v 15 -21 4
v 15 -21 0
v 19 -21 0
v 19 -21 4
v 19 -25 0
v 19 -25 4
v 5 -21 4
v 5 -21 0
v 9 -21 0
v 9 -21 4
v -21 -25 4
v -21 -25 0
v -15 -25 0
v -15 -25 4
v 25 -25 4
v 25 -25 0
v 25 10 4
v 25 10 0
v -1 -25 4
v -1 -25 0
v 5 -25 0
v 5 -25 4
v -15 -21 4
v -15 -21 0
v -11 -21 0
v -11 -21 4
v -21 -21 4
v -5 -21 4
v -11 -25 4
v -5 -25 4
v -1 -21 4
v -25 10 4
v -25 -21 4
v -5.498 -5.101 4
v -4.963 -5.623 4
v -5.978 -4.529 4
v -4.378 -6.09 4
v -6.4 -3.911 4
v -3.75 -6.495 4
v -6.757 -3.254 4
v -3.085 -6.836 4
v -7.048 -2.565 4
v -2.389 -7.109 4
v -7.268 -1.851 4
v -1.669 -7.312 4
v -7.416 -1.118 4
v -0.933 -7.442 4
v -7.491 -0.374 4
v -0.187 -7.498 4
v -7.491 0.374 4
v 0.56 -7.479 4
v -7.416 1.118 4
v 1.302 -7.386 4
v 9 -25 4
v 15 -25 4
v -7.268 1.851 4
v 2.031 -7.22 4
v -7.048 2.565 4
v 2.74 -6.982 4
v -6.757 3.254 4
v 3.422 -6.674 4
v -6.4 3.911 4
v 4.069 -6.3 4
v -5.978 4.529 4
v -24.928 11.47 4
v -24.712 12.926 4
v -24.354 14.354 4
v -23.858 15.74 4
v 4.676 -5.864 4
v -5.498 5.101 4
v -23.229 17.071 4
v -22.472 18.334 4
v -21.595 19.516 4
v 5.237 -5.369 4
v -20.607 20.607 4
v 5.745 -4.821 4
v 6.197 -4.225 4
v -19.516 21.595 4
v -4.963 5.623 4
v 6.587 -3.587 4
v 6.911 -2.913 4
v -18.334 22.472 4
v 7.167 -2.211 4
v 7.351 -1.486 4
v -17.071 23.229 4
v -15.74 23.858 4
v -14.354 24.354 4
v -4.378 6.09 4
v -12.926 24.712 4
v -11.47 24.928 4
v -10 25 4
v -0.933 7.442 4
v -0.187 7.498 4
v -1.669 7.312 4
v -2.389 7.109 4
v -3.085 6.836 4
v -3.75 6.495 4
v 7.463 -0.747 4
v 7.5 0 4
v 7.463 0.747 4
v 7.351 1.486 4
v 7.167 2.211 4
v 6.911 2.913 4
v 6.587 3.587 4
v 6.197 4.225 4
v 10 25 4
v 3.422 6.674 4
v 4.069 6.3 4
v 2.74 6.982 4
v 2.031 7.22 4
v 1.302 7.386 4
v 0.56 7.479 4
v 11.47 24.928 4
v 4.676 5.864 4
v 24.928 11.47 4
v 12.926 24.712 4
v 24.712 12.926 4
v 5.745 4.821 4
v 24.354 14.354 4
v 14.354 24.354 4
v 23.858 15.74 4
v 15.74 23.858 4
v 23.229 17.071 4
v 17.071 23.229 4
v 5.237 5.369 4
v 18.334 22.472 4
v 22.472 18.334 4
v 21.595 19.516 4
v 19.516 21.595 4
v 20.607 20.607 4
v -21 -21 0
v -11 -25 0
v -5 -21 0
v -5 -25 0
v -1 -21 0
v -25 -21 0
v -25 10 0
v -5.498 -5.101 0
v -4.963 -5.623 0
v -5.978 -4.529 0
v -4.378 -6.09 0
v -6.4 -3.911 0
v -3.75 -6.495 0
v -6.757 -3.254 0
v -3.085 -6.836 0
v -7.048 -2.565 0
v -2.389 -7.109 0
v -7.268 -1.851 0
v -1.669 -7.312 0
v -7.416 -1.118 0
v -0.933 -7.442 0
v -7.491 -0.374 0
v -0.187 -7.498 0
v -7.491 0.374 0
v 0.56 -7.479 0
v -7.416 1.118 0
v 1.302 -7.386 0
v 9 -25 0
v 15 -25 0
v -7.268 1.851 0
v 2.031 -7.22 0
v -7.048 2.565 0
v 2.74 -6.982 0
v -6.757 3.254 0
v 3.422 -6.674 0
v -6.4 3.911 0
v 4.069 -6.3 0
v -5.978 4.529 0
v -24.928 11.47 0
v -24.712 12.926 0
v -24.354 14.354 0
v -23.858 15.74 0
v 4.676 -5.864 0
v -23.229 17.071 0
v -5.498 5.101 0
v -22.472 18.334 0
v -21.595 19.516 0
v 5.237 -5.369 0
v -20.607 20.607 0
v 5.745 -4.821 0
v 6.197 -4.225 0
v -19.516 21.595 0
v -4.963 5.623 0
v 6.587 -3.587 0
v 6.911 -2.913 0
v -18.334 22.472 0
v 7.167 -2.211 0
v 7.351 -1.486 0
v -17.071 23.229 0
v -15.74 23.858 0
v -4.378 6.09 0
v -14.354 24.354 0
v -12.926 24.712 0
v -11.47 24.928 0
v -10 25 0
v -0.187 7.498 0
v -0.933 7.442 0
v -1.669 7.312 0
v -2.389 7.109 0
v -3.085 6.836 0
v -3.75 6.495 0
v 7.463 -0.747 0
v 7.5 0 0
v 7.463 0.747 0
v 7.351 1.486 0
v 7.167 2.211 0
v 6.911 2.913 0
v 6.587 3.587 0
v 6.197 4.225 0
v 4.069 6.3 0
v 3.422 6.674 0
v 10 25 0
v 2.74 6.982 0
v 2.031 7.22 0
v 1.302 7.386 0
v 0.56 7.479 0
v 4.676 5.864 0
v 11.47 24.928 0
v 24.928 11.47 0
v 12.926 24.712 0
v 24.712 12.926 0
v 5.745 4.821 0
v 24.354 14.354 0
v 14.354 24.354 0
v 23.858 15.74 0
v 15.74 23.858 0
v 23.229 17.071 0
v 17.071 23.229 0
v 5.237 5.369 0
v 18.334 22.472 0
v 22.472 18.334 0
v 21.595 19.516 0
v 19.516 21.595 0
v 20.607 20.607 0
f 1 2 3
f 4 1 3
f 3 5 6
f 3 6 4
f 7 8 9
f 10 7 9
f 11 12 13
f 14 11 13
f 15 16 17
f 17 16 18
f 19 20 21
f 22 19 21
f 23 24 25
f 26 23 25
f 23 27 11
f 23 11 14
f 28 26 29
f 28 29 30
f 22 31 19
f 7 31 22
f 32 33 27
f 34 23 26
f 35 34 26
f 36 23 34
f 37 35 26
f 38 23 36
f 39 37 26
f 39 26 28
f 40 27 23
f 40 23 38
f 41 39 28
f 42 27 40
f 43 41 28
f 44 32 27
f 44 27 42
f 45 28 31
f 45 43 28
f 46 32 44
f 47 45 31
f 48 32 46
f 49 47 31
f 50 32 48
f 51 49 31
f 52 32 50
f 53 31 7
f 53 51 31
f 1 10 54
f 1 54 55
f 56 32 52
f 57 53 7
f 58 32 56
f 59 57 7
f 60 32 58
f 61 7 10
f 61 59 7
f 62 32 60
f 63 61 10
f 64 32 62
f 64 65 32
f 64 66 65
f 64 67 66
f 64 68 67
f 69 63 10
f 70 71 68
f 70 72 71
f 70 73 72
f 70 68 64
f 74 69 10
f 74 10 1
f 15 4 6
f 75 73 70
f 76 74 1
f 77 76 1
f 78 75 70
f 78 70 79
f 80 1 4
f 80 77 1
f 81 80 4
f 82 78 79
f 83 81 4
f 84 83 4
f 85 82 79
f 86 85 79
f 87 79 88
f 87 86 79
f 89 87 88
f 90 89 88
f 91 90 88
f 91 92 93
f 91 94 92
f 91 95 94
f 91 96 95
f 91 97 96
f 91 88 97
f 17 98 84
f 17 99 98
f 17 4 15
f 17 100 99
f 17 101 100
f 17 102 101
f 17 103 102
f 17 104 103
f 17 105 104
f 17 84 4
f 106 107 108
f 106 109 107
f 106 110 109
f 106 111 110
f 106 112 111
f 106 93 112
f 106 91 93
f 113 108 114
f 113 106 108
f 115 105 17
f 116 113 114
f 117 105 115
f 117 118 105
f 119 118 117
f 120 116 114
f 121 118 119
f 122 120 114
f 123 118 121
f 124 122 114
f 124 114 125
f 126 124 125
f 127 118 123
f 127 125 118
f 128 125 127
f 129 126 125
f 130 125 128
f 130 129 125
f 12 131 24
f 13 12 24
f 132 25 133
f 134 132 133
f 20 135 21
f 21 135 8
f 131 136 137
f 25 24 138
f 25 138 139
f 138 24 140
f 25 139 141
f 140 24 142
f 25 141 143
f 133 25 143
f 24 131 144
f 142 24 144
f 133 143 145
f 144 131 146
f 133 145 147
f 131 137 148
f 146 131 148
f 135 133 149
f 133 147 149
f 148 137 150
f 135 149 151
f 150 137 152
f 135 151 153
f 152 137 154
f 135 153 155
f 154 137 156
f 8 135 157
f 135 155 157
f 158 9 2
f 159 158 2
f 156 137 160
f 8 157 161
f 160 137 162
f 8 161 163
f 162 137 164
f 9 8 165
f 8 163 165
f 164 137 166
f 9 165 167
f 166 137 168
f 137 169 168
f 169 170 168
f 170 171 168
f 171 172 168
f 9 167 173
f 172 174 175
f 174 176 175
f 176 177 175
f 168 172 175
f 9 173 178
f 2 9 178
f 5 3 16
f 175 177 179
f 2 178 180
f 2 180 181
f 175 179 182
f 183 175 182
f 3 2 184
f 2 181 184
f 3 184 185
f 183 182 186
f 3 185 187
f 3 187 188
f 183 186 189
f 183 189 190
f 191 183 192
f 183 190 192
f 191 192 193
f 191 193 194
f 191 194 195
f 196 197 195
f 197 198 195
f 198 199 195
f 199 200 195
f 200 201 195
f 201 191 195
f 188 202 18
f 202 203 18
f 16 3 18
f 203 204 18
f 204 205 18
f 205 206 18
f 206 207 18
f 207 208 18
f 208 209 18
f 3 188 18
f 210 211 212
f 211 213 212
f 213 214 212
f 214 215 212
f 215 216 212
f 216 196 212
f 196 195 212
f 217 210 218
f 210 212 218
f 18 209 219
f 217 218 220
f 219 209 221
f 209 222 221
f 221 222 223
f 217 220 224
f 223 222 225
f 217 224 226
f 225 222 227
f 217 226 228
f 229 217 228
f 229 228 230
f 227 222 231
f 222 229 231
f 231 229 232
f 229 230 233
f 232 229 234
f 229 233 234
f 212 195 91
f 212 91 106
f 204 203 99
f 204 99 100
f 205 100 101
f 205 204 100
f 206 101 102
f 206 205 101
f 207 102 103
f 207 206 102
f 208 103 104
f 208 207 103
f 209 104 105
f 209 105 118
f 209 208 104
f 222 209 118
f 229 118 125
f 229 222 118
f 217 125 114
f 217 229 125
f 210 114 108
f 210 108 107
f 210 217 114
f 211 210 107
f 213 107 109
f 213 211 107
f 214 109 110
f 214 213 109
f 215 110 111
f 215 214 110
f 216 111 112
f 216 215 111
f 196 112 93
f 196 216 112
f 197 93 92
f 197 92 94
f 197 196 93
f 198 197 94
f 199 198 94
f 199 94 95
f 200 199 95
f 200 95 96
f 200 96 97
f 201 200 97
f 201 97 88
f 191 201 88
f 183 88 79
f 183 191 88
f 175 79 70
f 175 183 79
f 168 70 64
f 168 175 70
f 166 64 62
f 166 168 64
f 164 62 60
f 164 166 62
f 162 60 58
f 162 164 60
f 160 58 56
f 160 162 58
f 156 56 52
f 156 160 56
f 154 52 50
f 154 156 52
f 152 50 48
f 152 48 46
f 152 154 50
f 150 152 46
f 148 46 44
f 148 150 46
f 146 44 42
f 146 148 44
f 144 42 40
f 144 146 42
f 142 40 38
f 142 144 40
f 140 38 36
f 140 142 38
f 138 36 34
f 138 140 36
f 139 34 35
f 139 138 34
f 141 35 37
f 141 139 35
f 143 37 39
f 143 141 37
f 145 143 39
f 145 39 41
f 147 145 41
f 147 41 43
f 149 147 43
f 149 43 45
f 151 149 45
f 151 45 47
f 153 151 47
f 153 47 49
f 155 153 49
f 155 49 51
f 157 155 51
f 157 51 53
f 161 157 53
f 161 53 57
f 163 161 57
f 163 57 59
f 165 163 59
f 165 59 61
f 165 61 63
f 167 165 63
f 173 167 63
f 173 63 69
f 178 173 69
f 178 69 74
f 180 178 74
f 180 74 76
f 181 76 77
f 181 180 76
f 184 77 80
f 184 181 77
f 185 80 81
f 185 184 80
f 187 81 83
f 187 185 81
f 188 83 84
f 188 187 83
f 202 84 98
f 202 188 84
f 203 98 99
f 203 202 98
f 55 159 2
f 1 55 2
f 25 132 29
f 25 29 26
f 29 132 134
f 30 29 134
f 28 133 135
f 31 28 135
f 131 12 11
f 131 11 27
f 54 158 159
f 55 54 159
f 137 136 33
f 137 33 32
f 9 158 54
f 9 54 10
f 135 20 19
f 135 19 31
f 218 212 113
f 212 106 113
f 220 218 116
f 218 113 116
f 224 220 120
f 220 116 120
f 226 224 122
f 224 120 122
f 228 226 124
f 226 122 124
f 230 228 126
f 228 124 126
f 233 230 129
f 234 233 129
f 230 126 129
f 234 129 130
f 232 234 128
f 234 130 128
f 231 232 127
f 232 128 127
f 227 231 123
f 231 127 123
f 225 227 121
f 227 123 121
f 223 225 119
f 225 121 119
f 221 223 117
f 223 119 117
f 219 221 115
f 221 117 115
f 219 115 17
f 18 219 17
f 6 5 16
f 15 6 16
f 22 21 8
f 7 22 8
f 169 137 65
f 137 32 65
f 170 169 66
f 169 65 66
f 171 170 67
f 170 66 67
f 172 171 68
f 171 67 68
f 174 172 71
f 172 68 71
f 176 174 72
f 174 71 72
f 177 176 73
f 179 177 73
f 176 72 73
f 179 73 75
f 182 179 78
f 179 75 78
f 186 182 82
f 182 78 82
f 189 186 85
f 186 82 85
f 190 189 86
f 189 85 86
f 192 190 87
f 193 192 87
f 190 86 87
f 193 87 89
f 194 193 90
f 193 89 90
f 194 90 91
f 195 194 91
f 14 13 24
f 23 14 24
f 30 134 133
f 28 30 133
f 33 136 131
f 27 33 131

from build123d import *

# Parameters (mm, degrees)
SKETCH1_W           = 50
SKETCH1_H           = 50
BOSS_EXTRUDE1_DEPTH = 4
SKETCH2_W           = 4
SKETCH2_H           = 4
CUT_EXTRUDE1_DEPTH  = 4
SKETCH3_R           = 7.5
CUT_EXTRUDE2_DEPTH  = 4
FILLET1_R           = 15


with BuildPart() as part:
    # Sketch1 → Boss-Extrude1 (new body)
    with BuildSketch(Plane.XY):
        Rectangle(SKETCH1_W, SKETCH1_H)
    extrude(amount=BOSS_EXTRUDE1_DEPTH)

    # Sketch2 → Cut-Extrude1 (cut)
    with BuildSketch(Plane.XY):
        with Locations((-23, -23)):
            Rectangle(SKETCH2_W, SKETCH2_H)
        with Locations((-13, -23)):
            Rectangle(SKETCH2_W, SKETCH2_H)
        with Locations((-3, -23)):
            Rectangle(SKETCH2_W, SKETCH2_H)
        with Locations((7, -23)):
            Rectangle(SKETCH2_W, SKETCH2_H)
        with Locations((17, -23)):
            Rectangle(SKETCH2_W, SKETCH2_H)
    extrude(amount=CUT_EXTRUDE1_DEPTH, mode=Mode.SUBTRACT)

    # Sketch3 → Cut-Extrude2 (cut)
    with BuildSketch(Plane.XY):
        Circle(SKETCH3_R)
    extrude(amount=CUT_EXTRUDE2_DEPTH, mode=Mode.SUBTRACT)

    # Fillet1
    fillet1_edges = [part.edges().sort_by_distance(p)[0] for p in [
        (-25, 25, 2),
        (25, 25, 2),
    ]]
    fillet(fillet1_edges, radius=FILLET1_R)


solid = part.part
